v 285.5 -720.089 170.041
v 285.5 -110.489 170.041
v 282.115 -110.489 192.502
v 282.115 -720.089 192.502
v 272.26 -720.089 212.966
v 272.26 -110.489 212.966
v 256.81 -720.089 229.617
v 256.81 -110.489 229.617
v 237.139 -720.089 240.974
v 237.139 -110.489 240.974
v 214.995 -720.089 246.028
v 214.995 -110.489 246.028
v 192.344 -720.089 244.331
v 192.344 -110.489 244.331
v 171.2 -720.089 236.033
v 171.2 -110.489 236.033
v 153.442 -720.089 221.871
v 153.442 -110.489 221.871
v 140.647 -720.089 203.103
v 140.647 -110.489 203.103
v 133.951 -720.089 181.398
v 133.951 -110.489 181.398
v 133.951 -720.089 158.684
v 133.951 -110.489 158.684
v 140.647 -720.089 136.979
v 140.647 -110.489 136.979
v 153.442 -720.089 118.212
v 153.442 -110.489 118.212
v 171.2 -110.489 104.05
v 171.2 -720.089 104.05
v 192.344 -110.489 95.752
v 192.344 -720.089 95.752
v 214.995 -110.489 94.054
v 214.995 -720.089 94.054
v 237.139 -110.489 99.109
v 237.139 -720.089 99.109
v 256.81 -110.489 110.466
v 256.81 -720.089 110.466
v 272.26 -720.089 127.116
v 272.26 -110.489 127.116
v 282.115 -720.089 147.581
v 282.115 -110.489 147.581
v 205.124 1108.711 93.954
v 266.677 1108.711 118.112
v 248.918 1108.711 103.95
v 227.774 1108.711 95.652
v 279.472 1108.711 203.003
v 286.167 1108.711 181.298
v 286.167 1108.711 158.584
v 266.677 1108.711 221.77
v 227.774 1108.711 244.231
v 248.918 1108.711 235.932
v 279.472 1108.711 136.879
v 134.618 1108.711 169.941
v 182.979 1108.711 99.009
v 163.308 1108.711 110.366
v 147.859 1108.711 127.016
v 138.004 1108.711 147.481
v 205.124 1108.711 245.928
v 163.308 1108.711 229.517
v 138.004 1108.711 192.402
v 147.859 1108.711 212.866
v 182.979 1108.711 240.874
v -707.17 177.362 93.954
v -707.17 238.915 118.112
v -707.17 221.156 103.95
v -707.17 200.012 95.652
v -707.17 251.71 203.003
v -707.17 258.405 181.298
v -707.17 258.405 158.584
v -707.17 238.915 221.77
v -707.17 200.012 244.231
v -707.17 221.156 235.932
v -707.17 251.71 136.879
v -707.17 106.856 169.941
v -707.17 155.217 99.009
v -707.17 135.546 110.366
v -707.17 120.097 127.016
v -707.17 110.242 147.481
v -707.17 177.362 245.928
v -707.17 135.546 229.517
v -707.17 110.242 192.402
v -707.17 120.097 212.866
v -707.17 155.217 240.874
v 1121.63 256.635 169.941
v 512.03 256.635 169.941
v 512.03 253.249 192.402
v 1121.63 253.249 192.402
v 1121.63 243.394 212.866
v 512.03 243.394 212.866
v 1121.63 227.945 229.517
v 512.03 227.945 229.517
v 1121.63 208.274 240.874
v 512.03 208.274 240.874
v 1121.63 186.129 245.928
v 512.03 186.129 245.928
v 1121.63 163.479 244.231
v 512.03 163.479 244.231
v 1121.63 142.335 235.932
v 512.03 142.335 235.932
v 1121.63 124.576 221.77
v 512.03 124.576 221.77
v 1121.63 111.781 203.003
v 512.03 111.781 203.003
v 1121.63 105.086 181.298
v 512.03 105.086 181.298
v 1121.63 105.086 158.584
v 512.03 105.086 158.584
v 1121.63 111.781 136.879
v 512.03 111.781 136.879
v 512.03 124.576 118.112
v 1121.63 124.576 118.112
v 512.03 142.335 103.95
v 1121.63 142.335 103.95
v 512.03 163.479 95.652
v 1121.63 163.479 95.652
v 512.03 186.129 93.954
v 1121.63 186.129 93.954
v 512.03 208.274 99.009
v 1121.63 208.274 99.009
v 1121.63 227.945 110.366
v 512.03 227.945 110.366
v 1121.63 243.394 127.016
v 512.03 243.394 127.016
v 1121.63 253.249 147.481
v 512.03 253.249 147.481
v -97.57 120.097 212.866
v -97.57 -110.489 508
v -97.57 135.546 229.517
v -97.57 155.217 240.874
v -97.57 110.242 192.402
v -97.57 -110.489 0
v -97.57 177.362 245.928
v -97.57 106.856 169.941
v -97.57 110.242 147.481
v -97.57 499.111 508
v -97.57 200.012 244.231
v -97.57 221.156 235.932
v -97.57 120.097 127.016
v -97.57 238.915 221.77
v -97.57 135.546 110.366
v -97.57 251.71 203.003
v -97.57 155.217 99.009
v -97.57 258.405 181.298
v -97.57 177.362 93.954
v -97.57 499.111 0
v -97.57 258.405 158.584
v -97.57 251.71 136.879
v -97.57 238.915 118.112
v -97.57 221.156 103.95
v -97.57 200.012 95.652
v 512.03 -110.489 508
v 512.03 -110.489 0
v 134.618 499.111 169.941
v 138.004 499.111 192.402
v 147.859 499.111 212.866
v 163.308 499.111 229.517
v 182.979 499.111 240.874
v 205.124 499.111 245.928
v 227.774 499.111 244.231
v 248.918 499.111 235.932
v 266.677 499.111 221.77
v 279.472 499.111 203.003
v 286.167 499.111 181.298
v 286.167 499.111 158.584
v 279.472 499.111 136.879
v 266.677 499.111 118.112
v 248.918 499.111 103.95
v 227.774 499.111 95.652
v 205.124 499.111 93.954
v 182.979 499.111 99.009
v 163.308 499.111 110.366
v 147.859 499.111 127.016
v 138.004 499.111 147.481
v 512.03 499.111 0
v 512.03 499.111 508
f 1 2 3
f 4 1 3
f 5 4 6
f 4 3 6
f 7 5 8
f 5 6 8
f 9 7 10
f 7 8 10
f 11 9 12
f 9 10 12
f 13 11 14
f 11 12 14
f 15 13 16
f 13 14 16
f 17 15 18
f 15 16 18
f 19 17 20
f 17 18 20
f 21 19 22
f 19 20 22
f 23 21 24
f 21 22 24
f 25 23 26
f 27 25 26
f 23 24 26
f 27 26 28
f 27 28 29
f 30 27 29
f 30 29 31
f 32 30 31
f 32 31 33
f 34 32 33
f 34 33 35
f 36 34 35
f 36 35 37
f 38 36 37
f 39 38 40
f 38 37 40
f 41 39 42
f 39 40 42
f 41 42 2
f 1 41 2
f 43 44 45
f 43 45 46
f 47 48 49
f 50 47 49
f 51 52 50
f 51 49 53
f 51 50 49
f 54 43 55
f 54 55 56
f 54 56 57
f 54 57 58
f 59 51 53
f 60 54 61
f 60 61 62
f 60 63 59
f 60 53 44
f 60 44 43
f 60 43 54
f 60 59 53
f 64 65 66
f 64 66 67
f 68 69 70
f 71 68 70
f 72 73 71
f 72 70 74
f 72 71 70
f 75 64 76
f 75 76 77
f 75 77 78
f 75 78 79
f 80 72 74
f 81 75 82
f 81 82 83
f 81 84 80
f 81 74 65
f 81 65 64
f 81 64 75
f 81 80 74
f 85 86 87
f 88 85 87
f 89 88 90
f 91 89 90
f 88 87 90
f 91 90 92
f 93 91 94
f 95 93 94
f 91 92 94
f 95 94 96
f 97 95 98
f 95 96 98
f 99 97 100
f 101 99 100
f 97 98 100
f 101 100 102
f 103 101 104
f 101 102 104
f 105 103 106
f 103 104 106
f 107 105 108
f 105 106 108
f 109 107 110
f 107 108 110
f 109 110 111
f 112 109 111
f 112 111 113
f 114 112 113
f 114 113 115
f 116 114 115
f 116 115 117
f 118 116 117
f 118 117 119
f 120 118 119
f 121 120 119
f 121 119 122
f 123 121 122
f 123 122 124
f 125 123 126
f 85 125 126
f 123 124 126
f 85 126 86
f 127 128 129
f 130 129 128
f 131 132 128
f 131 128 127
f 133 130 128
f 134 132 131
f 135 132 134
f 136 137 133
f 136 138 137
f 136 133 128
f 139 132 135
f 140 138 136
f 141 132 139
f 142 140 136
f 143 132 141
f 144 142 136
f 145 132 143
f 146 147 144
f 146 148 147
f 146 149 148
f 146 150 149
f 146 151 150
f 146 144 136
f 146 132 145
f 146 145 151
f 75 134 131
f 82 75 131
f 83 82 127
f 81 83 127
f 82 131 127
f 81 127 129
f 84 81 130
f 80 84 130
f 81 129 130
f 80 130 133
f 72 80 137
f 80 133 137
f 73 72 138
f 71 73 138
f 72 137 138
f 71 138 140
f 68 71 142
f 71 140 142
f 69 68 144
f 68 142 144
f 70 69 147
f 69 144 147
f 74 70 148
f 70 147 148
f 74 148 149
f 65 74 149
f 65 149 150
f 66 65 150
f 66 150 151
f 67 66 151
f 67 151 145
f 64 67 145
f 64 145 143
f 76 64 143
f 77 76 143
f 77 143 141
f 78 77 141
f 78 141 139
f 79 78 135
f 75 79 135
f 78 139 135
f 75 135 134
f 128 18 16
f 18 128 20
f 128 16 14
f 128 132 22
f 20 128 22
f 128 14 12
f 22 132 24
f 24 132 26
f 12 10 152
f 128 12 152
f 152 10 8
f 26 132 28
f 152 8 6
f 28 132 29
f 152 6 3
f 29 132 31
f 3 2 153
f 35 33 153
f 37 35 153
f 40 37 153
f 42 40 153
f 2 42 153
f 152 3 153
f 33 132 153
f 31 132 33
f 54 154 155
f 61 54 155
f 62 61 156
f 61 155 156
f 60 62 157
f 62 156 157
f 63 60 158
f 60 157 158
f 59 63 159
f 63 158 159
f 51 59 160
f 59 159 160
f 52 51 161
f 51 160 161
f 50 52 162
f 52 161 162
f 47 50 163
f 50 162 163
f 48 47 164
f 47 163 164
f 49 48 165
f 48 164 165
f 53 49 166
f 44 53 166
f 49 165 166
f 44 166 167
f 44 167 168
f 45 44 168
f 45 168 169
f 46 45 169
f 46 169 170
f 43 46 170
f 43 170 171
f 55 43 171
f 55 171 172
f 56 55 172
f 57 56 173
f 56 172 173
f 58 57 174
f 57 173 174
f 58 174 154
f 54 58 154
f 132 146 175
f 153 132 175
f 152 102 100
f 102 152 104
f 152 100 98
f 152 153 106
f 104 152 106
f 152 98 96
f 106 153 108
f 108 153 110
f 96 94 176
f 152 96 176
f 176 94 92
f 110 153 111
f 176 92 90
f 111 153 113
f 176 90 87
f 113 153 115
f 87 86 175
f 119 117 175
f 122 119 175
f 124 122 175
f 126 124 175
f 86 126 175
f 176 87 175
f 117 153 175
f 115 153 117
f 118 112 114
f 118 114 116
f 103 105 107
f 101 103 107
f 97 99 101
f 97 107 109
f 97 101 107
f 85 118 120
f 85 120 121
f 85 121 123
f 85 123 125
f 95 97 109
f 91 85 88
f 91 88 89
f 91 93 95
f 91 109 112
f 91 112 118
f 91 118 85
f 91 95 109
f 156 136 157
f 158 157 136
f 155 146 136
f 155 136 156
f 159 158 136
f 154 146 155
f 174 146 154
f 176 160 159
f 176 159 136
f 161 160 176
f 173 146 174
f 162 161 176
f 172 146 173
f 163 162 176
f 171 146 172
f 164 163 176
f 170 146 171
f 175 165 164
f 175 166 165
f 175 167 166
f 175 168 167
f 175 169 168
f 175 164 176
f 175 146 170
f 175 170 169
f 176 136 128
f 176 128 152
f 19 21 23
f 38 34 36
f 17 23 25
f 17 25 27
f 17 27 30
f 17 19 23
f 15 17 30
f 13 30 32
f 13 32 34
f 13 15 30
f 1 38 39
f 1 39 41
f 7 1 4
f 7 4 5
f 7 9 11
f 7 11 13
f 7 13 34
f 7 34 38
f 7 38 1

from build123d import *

# Parameters (mm, degrees)
F0_W     = 609.6
F0_H     = 609.6
F1_DEPTH = 508
F2_R     = 76.2
F3_DEPTH = 609.6
F4_R     = 76.2
F5_DEPTH = 609.6
F6_R     = 76.2
F7_DEPTH = 609.6
F8_R     = 76.2
F9_DEPTH = 609.6


with BuildPart() as f1:
    # F0 (on Top) → F1 (new body)
    with BuildSketch(Plane.XY):
        with Locations((207.229508, 194.311477)):
            Rectangle(F0_W, F0_H)
    extrude(amount=F1_DEPTH)

    # F2 (on face) → F3 (join)
    with BuildSketch(Plane.XZ.offset(110.488523)):
        with Locations((209.300384, 170.041427)):
            Circle(F2_R)
    extrude(amount=F3_DEPTH)

    # F4 (on face) → F5 (join)
    with BuildSketch(Plane(origin=(-97.570492, 0, 0), x_dir=(0, -1, 0), z_dir=(-1, 0, 0))):
        with Locations((-183.056265, 169.941157)):
            Circle(F4_R)
    extrude(amount=F5_DEPTH)

    # F6 (on face) → F7 (join)
    with BuildSketch(Plane(origin=(0, 499.111477, 0), x_dir=(-1, 0, 0), z_dir=(0, 1, 0))):
        with Locations((-210.818216, 169.941157)):
            Circle(F6_R)
    extrude(amount=F7_DEPTH)

    # F8 (on face) → F9 (join)
    with BuildSketch(Plane.YZ.offset(512.029508)):
        with Locations((180.434614, 169.941157)):
            Circle(F8_R)
    extrude(amount=F9_DEPTH)


solid = f1.part
